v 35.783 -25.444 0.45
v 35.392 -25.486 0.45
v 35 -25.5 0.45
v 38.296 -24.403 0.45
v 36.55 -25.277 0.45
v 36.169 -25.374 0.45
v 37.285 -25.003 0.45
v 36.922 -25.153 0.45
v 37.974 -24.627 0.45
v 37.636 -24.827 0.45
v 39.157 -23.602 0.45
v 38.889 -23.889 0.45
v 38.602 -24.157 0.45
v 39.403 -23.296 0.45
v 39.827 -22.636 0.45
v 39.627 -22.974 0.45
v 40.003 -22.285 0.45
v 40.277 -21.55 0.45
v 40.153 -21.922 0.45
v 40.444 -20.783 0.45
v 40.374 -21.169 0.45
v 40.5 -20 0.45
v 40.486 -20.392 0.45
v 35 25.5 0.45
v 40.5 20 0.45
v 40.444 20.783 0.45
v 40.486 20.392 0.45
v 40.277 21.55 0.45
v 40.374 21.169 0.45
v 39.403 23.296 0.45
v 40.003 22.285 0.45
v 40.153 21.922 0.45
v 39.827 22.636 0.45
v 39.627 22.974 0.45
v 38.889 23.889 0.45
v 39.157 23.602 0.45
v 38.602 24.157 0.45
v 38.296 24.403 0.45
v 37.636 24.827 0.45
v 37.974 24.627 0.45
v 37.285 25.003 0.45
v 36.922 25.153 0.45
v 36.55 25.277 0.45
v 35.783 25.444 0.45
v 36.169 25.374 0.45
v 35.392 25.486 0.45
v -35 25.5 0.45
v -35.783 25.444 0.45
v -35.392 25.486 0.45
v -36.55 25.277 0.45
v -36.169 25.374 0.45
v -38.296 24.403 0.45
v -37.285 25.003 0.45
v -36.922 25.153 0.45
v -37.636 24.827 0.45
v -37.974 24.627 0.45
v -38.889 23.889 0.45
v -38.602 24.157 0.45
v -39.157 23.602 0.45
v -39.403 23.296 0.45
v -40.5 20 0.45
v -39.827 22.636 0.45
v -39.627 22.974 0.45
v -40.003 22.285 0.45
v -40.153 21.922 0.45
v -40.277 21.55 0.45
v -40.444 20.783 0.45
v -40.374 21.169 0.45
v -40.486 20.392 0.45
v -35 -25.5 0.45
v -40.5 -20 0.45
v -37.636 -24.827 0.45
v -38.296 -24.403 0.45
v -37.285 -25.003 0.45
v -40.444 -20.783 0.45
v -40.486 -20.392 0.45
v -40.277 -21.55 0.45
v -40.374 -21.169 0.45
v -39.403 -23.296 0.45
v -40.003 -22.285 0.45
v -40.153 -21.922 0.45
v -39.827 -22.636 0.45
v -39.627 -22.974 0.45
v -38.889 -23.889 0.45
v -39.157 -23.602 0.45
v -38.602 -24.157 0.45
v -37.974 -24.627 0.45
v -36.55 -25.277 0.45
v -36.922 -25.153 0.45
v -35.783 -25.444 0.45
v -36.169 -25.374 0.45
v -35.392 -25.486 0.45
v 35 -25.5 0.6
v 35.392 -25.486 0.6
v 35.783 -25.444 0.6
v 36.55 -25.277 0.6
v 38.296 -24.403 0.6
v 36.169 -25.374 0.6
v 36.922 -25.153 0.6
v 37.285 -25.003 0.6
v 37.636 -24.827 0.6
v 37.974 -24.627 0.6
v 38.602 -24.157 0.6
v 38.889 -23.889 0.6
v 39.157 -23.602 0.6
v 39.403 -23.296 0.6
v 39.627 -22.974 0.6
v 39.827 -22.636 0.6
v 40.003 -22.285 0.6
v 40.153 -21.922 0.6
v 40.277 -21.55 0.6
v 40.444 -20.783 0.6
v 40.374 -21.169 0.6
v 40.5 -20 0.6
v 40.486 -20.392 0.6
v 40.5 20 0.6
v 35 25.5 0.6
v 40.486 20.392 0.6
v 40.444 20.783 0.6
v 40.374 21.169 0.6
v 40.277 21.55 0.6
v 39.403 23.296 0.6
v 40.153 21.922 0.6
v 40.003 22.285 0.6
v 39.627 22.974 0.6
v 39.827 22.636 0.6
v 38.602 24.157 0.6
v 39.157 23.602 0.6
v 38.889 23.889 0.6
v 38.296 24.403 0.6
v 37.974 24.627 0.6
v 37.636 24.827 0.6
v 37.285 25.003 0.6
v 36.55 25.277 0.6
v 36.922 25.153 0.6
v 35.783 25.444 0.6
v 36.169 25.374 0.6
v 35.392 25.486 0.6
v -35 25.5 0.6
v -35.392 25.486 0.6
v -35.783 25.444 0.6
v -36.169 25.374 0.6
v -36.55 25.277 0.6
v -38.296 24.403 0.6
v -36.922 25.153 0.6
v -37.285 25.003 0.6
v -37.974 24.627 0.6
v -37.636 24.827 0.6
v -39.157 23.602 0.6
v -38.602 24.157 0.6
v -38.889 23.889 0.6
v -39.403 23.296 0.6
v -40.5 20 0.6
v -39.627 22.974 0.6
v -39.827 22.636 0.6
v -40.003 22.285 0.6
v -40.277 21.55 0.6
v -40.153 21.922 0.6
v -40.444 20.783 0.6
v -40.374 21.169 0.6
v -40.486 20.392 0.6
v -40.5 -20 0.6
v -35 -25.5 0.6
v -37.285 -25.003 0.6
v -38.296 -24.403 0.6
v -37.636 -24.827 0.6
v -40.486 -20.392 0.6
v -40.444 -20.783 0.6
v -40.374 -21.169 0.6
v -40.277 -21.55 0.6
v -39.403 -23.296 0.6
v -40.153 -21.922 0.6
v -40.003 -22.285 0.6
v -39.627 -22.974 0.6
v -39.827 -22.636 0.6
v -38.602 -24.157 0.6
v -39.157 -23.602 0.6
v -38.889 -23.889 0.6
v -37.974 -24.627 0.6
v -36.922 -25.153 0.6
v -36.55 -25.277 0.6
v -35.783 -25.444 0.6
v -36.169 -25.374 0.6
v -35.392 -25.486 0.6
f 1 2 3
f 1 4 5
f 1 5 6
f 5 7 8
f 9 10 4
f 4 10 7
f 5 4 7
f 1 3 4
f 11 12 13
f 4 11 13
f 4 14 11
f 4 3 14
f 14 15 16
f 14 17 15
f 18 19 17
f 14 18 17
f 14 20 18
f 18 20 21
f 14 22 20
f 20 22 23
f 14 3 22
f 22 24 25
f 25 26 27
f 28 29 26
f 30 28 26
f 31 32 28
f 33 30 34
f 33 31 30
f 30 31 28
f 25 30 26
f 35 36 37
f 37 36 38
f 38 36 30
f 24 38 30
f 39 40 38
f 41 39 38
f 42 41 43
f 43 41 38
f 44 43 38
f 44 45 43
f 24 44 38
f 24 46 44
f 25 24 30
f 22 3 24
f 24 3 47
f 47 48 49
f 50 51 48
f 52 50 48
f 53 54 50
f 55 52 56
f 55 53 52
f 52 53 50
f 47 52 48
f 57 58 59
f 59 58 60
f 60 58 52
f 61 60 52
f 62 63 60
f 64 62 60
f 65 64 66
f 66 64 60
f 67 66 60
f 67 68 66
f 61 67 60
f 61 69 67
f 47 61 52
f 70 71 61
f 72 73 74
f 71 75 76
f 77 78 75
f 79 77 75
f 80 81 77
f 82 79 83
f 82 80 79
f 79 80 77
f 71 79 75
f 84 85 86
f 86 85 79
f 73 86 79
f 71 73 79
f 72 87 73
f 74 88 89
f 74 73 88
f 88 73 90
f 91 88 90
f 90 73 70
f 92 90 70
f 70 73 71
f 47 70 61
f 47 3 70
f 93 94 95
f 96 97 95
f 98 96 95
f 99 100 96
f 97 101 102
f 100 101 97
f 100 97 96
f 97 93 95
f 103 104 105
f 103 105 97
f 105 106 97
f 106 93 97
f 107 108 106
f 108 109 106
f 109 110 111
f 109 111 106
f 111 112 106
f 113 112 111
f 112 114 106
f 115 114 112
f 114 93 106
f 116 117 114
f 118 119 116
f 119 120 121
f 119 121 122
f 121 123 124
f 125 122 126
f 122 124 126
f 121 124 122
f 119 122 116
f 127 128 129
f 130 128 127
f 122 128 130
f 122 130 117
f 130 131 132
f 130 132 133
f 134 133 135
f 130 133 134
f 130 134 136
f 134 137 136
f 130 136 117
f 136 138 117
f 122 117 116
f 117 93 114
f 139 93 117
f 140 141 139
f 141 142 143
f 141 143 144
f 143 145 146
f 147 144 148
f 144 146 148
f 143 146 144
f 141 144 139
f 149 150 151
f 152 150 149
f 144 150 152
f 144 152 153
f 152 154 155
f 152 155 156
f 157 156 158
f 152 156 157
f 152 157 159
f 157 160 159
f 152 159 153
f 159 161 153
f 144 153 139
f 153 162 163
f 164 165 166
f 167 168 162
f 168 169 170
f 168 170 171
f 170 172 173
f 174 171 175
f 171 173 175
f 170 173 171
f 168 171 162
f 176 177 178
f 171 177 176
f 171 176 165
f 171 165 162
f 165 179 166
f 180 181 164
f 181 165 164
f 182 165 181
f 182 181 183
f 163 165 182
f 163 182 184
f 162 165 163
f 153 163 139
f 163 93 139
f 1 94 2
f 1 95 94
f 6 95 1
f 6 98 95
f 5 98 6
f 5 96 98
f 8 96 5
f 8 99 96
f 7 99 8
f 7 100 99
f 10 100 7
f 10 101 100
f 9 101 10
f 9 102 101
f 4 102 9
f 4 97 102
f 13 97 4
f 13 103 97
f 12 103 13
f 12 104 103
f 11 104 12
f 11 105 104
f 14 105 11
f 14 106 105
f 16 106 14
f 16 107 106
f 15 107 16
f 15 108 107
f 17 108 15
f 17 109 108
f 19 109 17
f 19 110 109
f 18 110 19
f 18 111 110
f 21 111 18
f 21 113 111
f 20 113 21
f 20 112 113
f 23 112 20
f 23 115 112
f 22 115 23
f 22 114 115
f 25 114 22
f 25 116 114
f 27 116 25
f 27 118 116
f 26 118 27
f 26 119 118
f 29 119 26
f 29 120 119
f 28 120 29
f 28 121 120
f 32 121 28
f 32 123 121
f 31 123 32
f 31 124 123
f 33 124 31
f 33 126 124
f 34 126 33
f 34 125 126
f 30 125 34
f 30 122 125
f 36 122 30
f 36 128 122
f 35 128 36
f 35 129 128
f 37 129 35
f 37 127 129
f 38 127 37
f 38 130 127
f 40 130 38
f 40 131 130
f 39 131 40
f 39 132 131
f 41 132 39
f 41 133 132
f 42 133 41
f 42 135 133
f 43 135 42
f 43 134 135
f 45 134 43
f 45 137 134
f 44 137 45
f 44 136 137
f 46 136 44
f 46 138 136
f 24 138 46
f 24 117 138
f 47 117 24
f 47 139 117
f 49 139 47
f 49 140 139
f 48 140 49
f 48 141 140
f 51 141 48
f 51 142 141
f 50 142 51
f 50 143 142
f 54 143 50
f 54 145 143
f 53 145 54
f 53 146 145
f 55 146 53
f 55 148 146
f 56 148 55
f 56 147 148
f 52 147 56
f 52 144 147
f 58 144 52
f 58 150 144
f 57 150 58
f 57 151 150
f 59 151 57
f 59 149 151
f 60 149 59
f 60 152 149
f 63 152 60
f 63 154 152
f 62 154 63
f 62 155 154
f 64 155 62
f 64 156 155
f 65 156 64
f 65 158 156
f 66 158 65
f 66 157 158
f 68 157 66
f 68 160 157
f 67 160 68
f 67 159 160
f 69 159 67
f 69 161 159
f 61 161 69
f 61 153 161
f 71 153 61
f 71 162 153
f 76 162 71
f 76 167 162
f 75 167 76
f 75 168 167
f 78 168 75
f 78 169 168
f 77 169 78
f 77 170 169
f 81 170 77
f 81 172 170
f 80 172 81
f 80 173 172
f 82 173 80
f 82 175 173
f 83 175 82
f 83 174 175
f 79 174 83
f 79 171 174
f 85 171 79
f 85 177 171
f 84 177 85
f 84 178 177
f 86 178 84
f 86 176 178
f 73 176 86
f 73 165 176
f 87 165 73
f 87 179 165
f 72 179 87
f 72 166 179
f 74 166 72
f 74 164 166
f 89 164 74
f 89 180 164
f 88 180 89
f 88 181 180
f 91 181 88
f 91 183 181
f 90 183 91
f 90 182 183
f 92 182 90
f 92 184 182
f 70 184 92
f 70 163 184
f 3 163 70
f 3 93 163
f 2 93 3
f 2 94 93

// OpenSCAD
// file: card5yellow.scad
module card5yellow_1()
{
 /* Generated by trace2scad version 20150415
    http://aggregate.org/MAKE/TRACE2SCAD/
    Optimized model has 203/417 original points
 */
 color([0.5, 0.5, 0.5])
 assign(minx=0) /* polygon minx=0 */
 assign(miny=0) /* polygon miny=0 */
 assign(maxx=20000) /* polygon maxx=20000 */
 assign(maxy=8000) /* polygon maxy=8000 */
 assign(dx=maxx-minx)
 assign(dy=maxy-miny)
 assign(maxd=((dx>dy)?dx:dy))
 scale([1/maxd, 1/maxd, 1])
 translate([-minx-dx/2, -miny-dy/2, 0])
 linear_extrude(height=1, convexity=203)
 union() {
  union() {
   polygon([[0,4000],[0,0],[3638,0],[3655,18],[3670,61],[3670,100],[3705,165],[3705,178],[3729,211],[3736,253],[3749,268],[3756,299],[3775,316],[3781,353],[3836,462],[3844,473],[3851,503],[3882,558],[3894,573],[3899,633],[3909,673],[3925,718],[3942,747],[3951,828],[3958,918],[3970,939],[3970,999],[3992,1026],[4012,1093],[4020,1113],[4020,1133],[4045,1167],[4045,1178],[4083,1258],[4090,1301],[4110,1328],[4117,1382],[4145,1436],[4145,1456],[4231,1629],[4273,1688],[4281,1728],[4376,1918],[4428,1973],[4485,2051],[4506,2087],[4553,2151],[4601,2206],[4621,2251],[4654,2288],[4709,2400],[4730,2426],[4730,2440],[4768,2470],[4837,2550],[4890,2587],[4923,2630],[5047,2743],[5078,2774],[5151,2826],[5179,2836],[5216,2880],[5270,2921],[5308,2958],[5376,3018],[5443,3085],[5515,3168],[5561,3225],[5582,3253],[5663,3333],[5753,3432],[5769,3448],[5828,3476],[5883,3528],[5965,3592],[6048,3664],[6138,3726],[6184,3773],[6238,3802],[6315,3870],[6348,3886],[6385,3920],[6393,3920],[6453,3981],[6506,4012],[6603,4108],[6666,4158],[6717,4188],[6788,4258],[6840,4291],[6886,4343],[6921,4398],[6944,4423],[6961,4468],[6990,4519],[6990,4544],[7015,4580],[7022,4623],[7040,4657],[7040,4750],[7065,4816],[7065,4853],[7082,4883],[7088,4983],[7115,5021],[7115,5053],[7160,5153],[7160,5233],[7180,5270],[7180,5394],[7210,5450],[7210,5478],[7219,5488],[7262,5568],[7303,5623],[7329,5664],[7443,5773],[7507,5843],[7548,5883],[7645,5969],[7699,6000],[7728,6042],[7763,6078],[7803,6113],[7879,6170],[7892,6186],[7933,6206],[7988,6243],[8054,6279],[8125,6330],[8193,6364],[8265,6416],[8278,6424],[8322,6465],[8331,6465],[8413,6501],[8431,6517],[8475,6580],[8475,6588],[8565,6679],[8565,6686],[8604,6734],[8658,6798],[8691,6850],[8699,6850],[8733,6883],[8803,6958],[8850,6996],[8978,7123],[9074,7196],[9133,7257],[9183,7280],[9227,7305],[9248,7324],[9368,7386],[9459,7419],[9478,7430],[9549,7460],[9563,7460],[9648,7490],[9697,7500],[9743,7527],[9888,7579],[9954,7608],[10050,7710],[10050,7798],[10065,7823],[10065,8000],[0,8000]], convexity=5);
   polygon([[19315,7966],[19315,7931],[19335,7869],[19335,7857],[19361,7808],[19394,7758],[19458,7696],[19546,7639],[19624,7606],[19723,7581],[19803,7570],[19888,7570],[19971,7583],[20000,7586],[20000,8000],[19315,8000]], convexity=5);
   polygon([[19623,567],[19568,561],[19493,544],[19408,519],[19333,489],[19243,439],[19178,393],[19106,324],[19056,252],[19031,200],[19005,96],[19005,50],[19016,0],[20000,0],[20000,545],[19933,560],[19799,575],[19678,574]], convexity=7);
  }
 }
}

module card5yellow()
{
 /* all layers combined, scaled to within a 1mm cube */
 scale([1, 1, 1/1])
 difference() {
  union() {
   scale([1,1,2]) translate([0,0,-0.5]) card5yellow_1();
  }
  translate([0,0,-2]) cube([2,2,4],center=true);
 }
}
card5yellow();
// file: card5orange.scad
module card5orange_1()
{
 /* Generated by trace2scad version 20150415
    http://aggregate.org/MAKE/TRACE2SCAD/
    Optimized model has 445/921 original points
 */
 color([0.5, 0.5, 0.5])
 assign(minx=0) /* polygon minx=0 */
 assign(miny=0) /* polygon miny=0 */
 assign(maxx=20000) /* polygon maxx=20000 */
 assign(maxy=8000) /* polygon maxy=8000 */
 assign(dx=maxx-minx)
 assign(dy=maxy-miny)
 assign(maxd=((dx>dy)?dx:dy))
 scale([1/maxd, 1/maxd, 1])
 translate([-minx-dx/2, -miny-dy/2, 0])
 linear_extrude(height=1, convexity=445)
 union() {
  union() {
   polygon([[0,7693],[0,7386],[120,7370],[223,7370],[323,7381],[422,7401],[513,7431],[615,7479],[698,7533],[774,7604],[799,7633],[850,7709],[850,7717],[869,7758],[895,7859],[895,7923],[875,8000],[0,8000]], convexity=5);
   polygon([[10082,7976],[10085,7953],[10091,7828],[10075,7798],[10075,7712],[10009,7643],[9979,7603],[9903,7569],[9803,7534],[9773,7526],[9693,7485],[9658,7479],[9498,7425],[9460,7405],[9398,7384],[9257,7313],[9198,7273],[9153,7251],[9076,7178],[9028,7138],[8978,7104],[8918,7035],[8833,6963],[8755,6884],[8755,6876],[8699,6833],[8681,6798],[8654,6773],[8635,6736],[8603,6709],[8571,6660],[8506,6600],[8499,6578],[8473,6547],[8441,6501],[8358,6461],[8334,6454],[8293,6417],[8198,6351],[8153,6329],[8061,6266],[7998,6234],[7924,6184],[7906,6173],[7828,6113],[7779,6068],[7743,6031],[7713,5991],[7658,5958],[7522,5836],[7484,5788],[7347,5660],[7328,5623],[7293,5582],[7251,5508],[7230,5468],[7230,5447],[7196,5390],[7190,5253],[7181,5163],[7165,5113],[7149,5090],[7130,5013],[7101,4962],[7095,4868],[7086,4823],[7074,4778],[7050,4727],[7050,4640],[7036,4586],[7024,4563],[7005,4539],[7005,4506],[6981,4471],[6974,4439],[6896,4328],[6848,4274],[6805,4254],[6748,4191],[6693,4157],[6628,4108],[6519,4000],[6468,3971],[6414,3915],[6406,3915],[6358,3873],[6323,3857],[6263,3800],[6205,3769],[6143,3712],[6073,3664],[6023,3617],[5955,3569],[5955,3561],[5883,3506],[5853,3474],[5775,3434],[5743,3393],[5692,3343],[5633,3277],[5607,3258],[5568,3203],[5561,3199],[5518,3143],[5432,3048],[5278,2907],[5225,2868],[5206,2835],[5169,2820],[5093,2765],[4874,2558],[4745,2428],[4739,2408],[4722,2388],[4683,2300],[4625,2223],[4619,2198],[4573,2146],[4529,2088],[4493,2031],[4448,1968],[4388,1902],[4290,1706],[4290,1683],[4251,1628],[4221,1568],[4184,1488],[4171,1473],[4164,1428],[4148,1403],[4135,1368],[4135,1346],[4119,1309],[4101,1283],[4095,1229],[4080,1211],[4069,1173],[4045,1138],[4024,1053],[3995,998],[3995,948],[3979,918],[3974,828],[3955,781],[3955,733],[3930,673],[3930,645],[3914,621],[3905,556],[3867,493],[3854,454],[3805,359],[3805,345],[3784,303],[3765,278],[3751,209],[3722,173],[3709,129],[3690,98],[3690,46],[3671,23],[3664,0],[10030,0],[10030,128],[10046,158],[10045,223],[10065,260],[10065,294],[10080,306],[10080,458],[10095,487],[10101,522],[10114,543],[10121,571],[10145,603],[10150,652],[10165,675],[10165,723],[10176,734],[10196,788],[10201,813],[10227,863],[10250,891],[10250,905],[10279,938],[10305,993],[10329,1016],[10336,1053],[10389,1128],[10419,1178],[10450,1207],[10450,1218],[10485,1261],[10485,1271],[10543,1333],[10571,1388],[10625,1463],[10645,1499],[10671,1530],[10690,1530],[10779,1618],[10786,1643],[10868,1729],[10891,1760],[10904,1760],[10950,1810],[10950,1821],[10985,1860],[10985,1872],[11065,1954],[11065,1973],[11165,2072],[11165,2086],[11222,2145],[11235,2145],[11274,2180],[11292,2180],[11408,2294],[11428,2300],[11471,2393],[11515,2444],[11515,2451],[11546,2490],[11550,2518],[11571,2560],[11580,2566],[11580,2589],[11590,2596],[11621,2660],[11630,2666],[11630,2698],[11646,2721],[11651,2752],[11680,2806],[11680,2848],[11695,2869],[11698,2973],[11715,3011],[11715,3104],[11730,3116],[11730,3145],[11761,3203],[11779,3223],[11805,3279],[11859,3330],[11875,3330],[11888,3354],[11925,3380],[11949,3380],[12030,3420],[12093,3451],[12140,3495],[12153,3495],[12224,3560],[12234,3560],[12292,3610],[12303,3610],[12351,3659],[12378,3666],[12408,3694],[12428,3700],[12443,3732],[12488,3765],[12503,3778],[12523,3811],[12558,3878],[12596,3903],[12610,3929],[12656,3960],[12664,3960],[12694,3985],[12761,4119],[12780,4137],[12780,4178],[12795,4207],[12800,4243],[12827,4313],[12830,4478],[12815,4491],[12815,4649],[12780,4718],[12780,4779],[12765,4791],[12765,4820],[12750,4843],[12745,4888],[12730,4918],[12730,4943],[12715,4962],[12715,4986],[12695,5012],[12696,5088],[12680,5118],[12680,5139],[12665,5151],[12665,5188],[12650,5209],[12645,5239],[12630,5268],[12630,5379],[12621,5385],[12590,5449],[12580,5456],[12580,5479],[12571,5485],[12530,5569],[12530,5592],[12501,5623],[12496,5656],[12440,5769],[12420,5786],[12400,5828],[12395,5859],[12380,5888],[12380,5909],[12365,5921],[12365,6083],[12380,6103],[12380,6124],[12395,6136],[12395,6153],[12415,6172],[12415,6204],[12430,6216],[12430,6248],[12447,6272],[12445,6303],[12465,6322],[12465,6374],[12480,6386],[12480,6404],[12497,6421],[12495,6453],[12515,6472],[12515,6524],[12530,6536],[12530,6558],[12565,6628],[12565,6654],[12580,6666],[12580,6858],[12596,6888],[12595,6973],[12615,7010],[12615,7033],[12630,7053],[12630,7078],[12665,7146],[12665,7174],[12675,7181],[12696,7224],[12715,7242],[12715,7253],[12745,7282],[12745,7303],[12765,7322],[12765,7344],[12781,7357],[12809,7418],[12830,7437],[12830,7456],[12855,7508],[12879,7519],[12886,7543],[12950,7609],[12950,7622],[13015,7689],[13015,7706],[13045,7716],[13051,7737],[13115,7807],[13115,7824],[13129,7835],[13135,7863],[13195,7978],[13201,8000],[10079,8000]], convexity=68);
   polygon([[19315,7966],[19315,7931],[19335,7869],[19335,7857],[19361,7808],[19394,7758],[19458,7696],[19546,7639],[19624,7606],[19723,7581],[19803,7570],[19888,7570],[19971,7583],[20000,7586],[20000,8000],[19315,8000]], convexity=5);
   polygon([[19623,567],[19568,561],[19493,544],[19408,519],[19333,489],[19243,439],[19178,393],[19106,324],[19056,252],[19031,200],[19005,96],[19005,50],[19016,0],[20000,0],[20000,545],[19933,560],[19799,575],[19678,574]], convexity=7);
   polygon([[0,280],[0,0],[589,0],[595,38],[610,92],[610,138],[586,232],[549,304],[490,376],[428,427],[359,471],[283,506],[228,526],[168,540],[33,560],[0,560]], convexity=5);
  }
 }
}

module card5orange()
{
 /* all layers combined, scaled to within a 1mm cube */
 scale([1, 1, 1/1])
 difference() {
  union() {
   scale([1,1,2]) translate([0,0,-0.5]) card5orange_1();
  }
  translate([0,0,-2]) cube([2,2,4],center=true);
 }
}
card5orange();
// file: card5red.scad
module card5red_1()
{
 /* Generated by trace2scad version 20150415
    http://aggregate.org/MAKE/TRACE2SCAD/
    Optimized model has 229/469 original points
 */
 color([0.5, 0.5, 0.5])
 assign(minx=0) /* polygon minx=0 */
 assign(miny=0) /* polygon miny=0 */
 assign(maxx=20000) /* polygon maxx=20000 */
 assign(maxy=8000) /* polygon maxy=8000 */
 assign(dx=maxx-minx)
 assign(dy=maxy-miny)
 assign(maxd=((dx>dy)?dx:dy))
 scale([1/maxd, 1/maxd, 1])
 translate([-minx-dx/2, -miny-dy/2, 0])
 linear_extrude(height=1, convexity=229)
 union() {
  union() {
   polygon([[0,7693],[0,7386],[120,7370],[223,7370],[323,7381],[422,7401],[513,7431],[615,7479],[698,7533],[774,7604],[799,7633],[850,7709],[850,7717],[869,7758],[895,7859],[895,7923],[875,8000],[0,8000]], convexity=5);
   polygon([[13165,7914],[13123,7830],[13115,7824],[13115,7810],[13093,7778],[13050,7730],[13050,7720],[13021,7705],[13014,7683],[12957,7623],[12931,7578],[12852,7497],[12830,7455],[12830,7431],[12795,7389],[12795,7379],[12765,7334],[12765,7323],[12750,7306],[12744,7278],[12700,7225],[12665,7155],[12665,7140],[12630,7070],[12630,7048],[12615,7028],[12615,7005],[12599,6973],[12600,6893],[12580,6855],[12580,6668],[12565,6643],[12565,6625],[12530,6554],[12530,6533],[12515,6508],[12515,6473],[12498,6454],[12500,6422],[12480,6403],[12480,6383],[12465,6358],[12465,6324],[12446,6300],[12451,6279],[12431,6233],[12419,6198],[12414,6170],[12400,6159],[12400,6142],[12380,6123],[12380,6098],[12365,6078],[12365,5938],[12380,5913],[12380,5893],[12395,5864],[12400,5837],[12421,5793],[12440,5772],[12495,5663],[12500,5633],[12530,5600],[12530,5575],[12580,5476],[12580,5459],[12607,5424],[12630,5374],[12630,5275],[12645,5246],[12649,5221],[12665,5190],[12665,5156],[12680,5144],[12680,5126],[12700,5080],[12699,5005],[12715,4987],[12715,4968],[12730,4948],[12730,4925],[12746,4893],[12750,4851],[12765,4823],[12765,4803],[12780,4778],[12780,4724],[12815,4657],[12815,4505],[12830,4475],[12827,4303],[12801,4233],[12795,4199],[12780,4170],[12780,4130],[12752,4098],[12740,4065],[12721,4038],[12699,3993],[12678,3969],[12625,3935],[12555,3864],[12541,3830],[12495,3766],[12445,3730],[12427,3700],[12393,3675],[12358,3656],[12333,3629],[12262,3581],[12249,3565],[12235,3565],[12166,3507],[12153,3497],[12128,3484],[12086,3445],[11955,3380],[11940,3380],[11898,3359],[11868,3330],[11809,3278],[11781,3222],[11767,3211],[11731,3133],[11718,3098],[11713,2993],[11699,2969],[11700,2875],[11680,2835],[11680,2802],[11650,2748],[11650,2725],[11630,2685],[11630,2670],[11604,2618],[11580,2586],[11580,2570],[11550,2510],[11550,2491],[11534,2478],[11516,2443],[11484,2403],[11471,2387],[11428,2299],[11408,2289],[11297,2183],[11229,2143],[11174,2093],[11151,2047],[11085,1994],[11059,1943],[10980,1861],[10980,1847],[10960,1829],[10931,1777],[10880,1744],[10855,1703],[10789,1638],[10770,1601],[10751,1594],[10744,1575],[10716,1560],[10709,1540],[10673,1521],[10651,1498],[10545,1338],[10545,1328],[10505,1287],[10337,1043],[10324,1006],[10309,993],[10281,938],[10261,920],[10243,878],[10217,838],[10179,735],[10165,724],[10165,675],[10150,646],[10146,600],[10115,552],[10115,540],[10100,511],[10095,479],[10080,458],[10080,301],[10065,289],[10065,255],[10048,223],[10051,165],[10030,119],[10030,0],[20000,0],[20000,8000],[13208,7999]], convexity=80);
   polygon([[0,280],[0,0],[589,0],[595,38],[610,92],[610,138],[586,232],[549,304],[490,376],[428,427],[359,471],[283,506],[228,526],[168,540],[33,560],[0,560]], convexity=5);
  }
 }
}

module card5red()
{
 /* all layers combined, scaled to within a 1mm cube */
 scale([1, 1, 1/1])
 difference() {
  union() {
   scale([1,1,2]) translate([0,0,-0.5]) card5red_1();
  }
  translate([0,0,-2]) cube([2,2,4],center=true);
 }
}
card5red();
// file: ../Parts/rounder.scad
// rounder.scad
// cutting tool for rounding off corners with a cylinder

//---------------------
module rounder(
r=10,   // radius
h=10,   // height
f=22,    // $fn
extra=0.01  // extra size for the cube
){

difference(){
  translate([-extra,-extra,-extra])
  cube([r+extra,r+extra,h+2*extra]);
  translate([r,r,-1])
  cylinder(r=r,h=h+2,$fn=f);
}

}

//---------------------------------------------------------------------------
module bevel(x=1,y=1,h=10){

linear_extrude(height=h)
polygon(points=[[0,0],[x,0],[0,y]]);
    
}
  

//========================

rounder();

//========================
// main file
//======================================================================
// card.scad
//
// Business card, version 5 with much wider color overlaps
// update version 7 to make it thinner
//
// DrTomFlint 13 Sept 2024
//
//======================================================================

use <../Parts/rounder.scad>
use <../Fractals/Lsystem.scad>
use <./card5red.scad>
use <./card5orange.scad>
use <./card5yellow.scad>

thick=0.45;
thin=0.15;

vspace=14;
tsize=8;
tspace=1.1;
x0=70;
y0=40;
r0=4;
lip=1.5;

mag=130;
//~ x1=5;
//~ x2=8;
//~ x3=11;

x1=3;
x2=10;
x3=15;
//----------------------------------------------------------------------
module text1(){

    $fn=200;
    
    // 
    translate([0,vspace,0])
    linear_extrude(height=thick)
    text("Dr Tom Flint", font = "Open Sans:style=Bold", size=tsize,halign="center",valign="center",spacing=tspace);

    translate([0,0,0])
    linear_extrude(height=thick)
    text("@gmail.com", font = "Open Sans:style=Bold", size=tsize,halign="center",valign="center",spacing=tspace);

    translate([0,-vspace,0])
    linear_extrude(height=thick)
    text("802-829-7207", font = "Open Sans:style=Bold", size=tsize,halign="center",valign="center",spacing=tspace);

}

//----------------------------------------------------------------------
module back1(){
  
  difference(){
    linear_extrude(height=thick)
    offset(r=r0,$fn=88)
    square([x0,y0],center=true);
    
    translate([0,0,-0.5])
    scale([1,1,3])
    text1();

  }
  
}

//----------------------------------------------------------------------
module lip1(){
  difference(){
    linear_extrude(height=thick)
    offset(r=r0+lip,$fn=88)
    square([x0,y0],center=true);

    translate([0,0,-thick/2])
    linear_extrude(height=2*thick)
    offset(r=r0,$fn=88)
    square([x0,y0],center=true);
  }
}

//----------------------------------------------------------------------
module base(){
  
  translate([0,0,-thin])
  intersection(){
    linear_extrude(height=thin)
    offset(r=r0+lip,$fn=88)
    square([x0,y0],center=true);
    
    translate([0,0,-thin])
    linear_extrude(height=thick)
    scale([4,4,1])
//    penrose_tiling(n=5, w=0.25);
    penrose_tiling(n=5, w=0.4);
  }
  // solid lip
  difference(){
    translate([0,0,-thin])
    linear_extrude(height=thin)
    offset(r=r0+lip,$fn=88)
    square([x0,y0],center=true);

    translate([0,0,-thick])
    linear_extrude(height=2*thick)
    offset(r=r0,$fn=88)
    square([x0,y0],center=true);
  }

}
//----------------------------------------------------------------------
// make a clear layer to add strength?
module base2(){
  
    translate([0,0,thick])
    linear_extrude(height=thin)
    offset(r=r0+lip,$fn=88)
    square([x0,y0],center=true);

}

//----------------------------------------------------------------------
module backred1(){
  
  intersection(){
    back1();
    translate([x1,0,0])
    scale([mag,mag,3*thick])
    card5red();
    translate([20,0,thin/2+0])
    cube([80,80,thin],center=true);
  }
}
//----------------------------------------------------------------------
module backred2(){
  
  intersection(){
    back1();
    translate([x2,0,0])
    scale([mag,mag,3*thick])
    card5red();
    translate([20,0,thin/2+thin])
    cube([80,80,thin],center=true);
  }
}
//----------------------------------------------------------------------
module backred3(){
  
  intersection(){
    back1();
    translate([x3,0,0])
    scale([mag,mag,3*thick])
    card5red();
    translate([20,0,thin/2+2*thin])
    cube([80,80,thin],center=true);
  }
}

//----------------------------------------------------------------------
module backorange1(){
  
  intersection(){
    back1();
    translate([x1,0,0])
    scale([mag,mag,3*thick])
    card5orange();
    translate([0,0,thin/2+0])
    cube([80,80,thin],center=true);
  }
}
//----------------------------------------------------------------------
module backorange2(){
  
  intersection(){
    back1();
    
    translate([x2,0,0])
    scale([mag,mag,3*thick])
    card5orange();
    
    translate([0,0,thin/2+thin])
    cube([80,80,thin],center=true);
  }
}
//----------------------------------------------------------------------
module backorange3(){
  
  intersection(){
    back1();
    translate([x3,0,0])
    scale([mag,mag,3*thick])
    card5orange();
    translate([0,0,thin/2+2*thin])
    cube([80,80,thin],center=true);
  }
}

//----------------------------------------------------------------------
module backyellow1(){
  
  intersection(){
    back1();
    
    translate([x1,0,0])
    scale([mag,mag,thin])
    card5yellow();
  }
}
//----------------------------------------------------------------------
module backyellow2(){
  
  intersection(){
    back1();

    translate([x2,0,thin])
    scale([mag,mag,thin])
    card5yellow();
  }
}
//----------------------------------------------------------------------
module backyellow3(){
  
  intersection(){
    back1();
    
    translate([x3,0,2*thin])
    scale([mag,mag,thin])
    card5yellow();    
  }
}

//======================================================================

// Don't print these, just for debug
//~ back1();
//~ backred();
//~ backorange();
//~ backyellow();


//~ text1();
//~ lip1();
//~ base();

// Stagger the border between colors for strength uncomment all 3 parts
// to make a single rendered part for each color

//~ backred1();
//~ backred2();
//~ backred3();

//~ backorange1();
//~ backorange2();
//~ backorange3();

//~ backyellow1();
//~ backyellow2();
//~ backyellow3();

base2();

//======================================================================
